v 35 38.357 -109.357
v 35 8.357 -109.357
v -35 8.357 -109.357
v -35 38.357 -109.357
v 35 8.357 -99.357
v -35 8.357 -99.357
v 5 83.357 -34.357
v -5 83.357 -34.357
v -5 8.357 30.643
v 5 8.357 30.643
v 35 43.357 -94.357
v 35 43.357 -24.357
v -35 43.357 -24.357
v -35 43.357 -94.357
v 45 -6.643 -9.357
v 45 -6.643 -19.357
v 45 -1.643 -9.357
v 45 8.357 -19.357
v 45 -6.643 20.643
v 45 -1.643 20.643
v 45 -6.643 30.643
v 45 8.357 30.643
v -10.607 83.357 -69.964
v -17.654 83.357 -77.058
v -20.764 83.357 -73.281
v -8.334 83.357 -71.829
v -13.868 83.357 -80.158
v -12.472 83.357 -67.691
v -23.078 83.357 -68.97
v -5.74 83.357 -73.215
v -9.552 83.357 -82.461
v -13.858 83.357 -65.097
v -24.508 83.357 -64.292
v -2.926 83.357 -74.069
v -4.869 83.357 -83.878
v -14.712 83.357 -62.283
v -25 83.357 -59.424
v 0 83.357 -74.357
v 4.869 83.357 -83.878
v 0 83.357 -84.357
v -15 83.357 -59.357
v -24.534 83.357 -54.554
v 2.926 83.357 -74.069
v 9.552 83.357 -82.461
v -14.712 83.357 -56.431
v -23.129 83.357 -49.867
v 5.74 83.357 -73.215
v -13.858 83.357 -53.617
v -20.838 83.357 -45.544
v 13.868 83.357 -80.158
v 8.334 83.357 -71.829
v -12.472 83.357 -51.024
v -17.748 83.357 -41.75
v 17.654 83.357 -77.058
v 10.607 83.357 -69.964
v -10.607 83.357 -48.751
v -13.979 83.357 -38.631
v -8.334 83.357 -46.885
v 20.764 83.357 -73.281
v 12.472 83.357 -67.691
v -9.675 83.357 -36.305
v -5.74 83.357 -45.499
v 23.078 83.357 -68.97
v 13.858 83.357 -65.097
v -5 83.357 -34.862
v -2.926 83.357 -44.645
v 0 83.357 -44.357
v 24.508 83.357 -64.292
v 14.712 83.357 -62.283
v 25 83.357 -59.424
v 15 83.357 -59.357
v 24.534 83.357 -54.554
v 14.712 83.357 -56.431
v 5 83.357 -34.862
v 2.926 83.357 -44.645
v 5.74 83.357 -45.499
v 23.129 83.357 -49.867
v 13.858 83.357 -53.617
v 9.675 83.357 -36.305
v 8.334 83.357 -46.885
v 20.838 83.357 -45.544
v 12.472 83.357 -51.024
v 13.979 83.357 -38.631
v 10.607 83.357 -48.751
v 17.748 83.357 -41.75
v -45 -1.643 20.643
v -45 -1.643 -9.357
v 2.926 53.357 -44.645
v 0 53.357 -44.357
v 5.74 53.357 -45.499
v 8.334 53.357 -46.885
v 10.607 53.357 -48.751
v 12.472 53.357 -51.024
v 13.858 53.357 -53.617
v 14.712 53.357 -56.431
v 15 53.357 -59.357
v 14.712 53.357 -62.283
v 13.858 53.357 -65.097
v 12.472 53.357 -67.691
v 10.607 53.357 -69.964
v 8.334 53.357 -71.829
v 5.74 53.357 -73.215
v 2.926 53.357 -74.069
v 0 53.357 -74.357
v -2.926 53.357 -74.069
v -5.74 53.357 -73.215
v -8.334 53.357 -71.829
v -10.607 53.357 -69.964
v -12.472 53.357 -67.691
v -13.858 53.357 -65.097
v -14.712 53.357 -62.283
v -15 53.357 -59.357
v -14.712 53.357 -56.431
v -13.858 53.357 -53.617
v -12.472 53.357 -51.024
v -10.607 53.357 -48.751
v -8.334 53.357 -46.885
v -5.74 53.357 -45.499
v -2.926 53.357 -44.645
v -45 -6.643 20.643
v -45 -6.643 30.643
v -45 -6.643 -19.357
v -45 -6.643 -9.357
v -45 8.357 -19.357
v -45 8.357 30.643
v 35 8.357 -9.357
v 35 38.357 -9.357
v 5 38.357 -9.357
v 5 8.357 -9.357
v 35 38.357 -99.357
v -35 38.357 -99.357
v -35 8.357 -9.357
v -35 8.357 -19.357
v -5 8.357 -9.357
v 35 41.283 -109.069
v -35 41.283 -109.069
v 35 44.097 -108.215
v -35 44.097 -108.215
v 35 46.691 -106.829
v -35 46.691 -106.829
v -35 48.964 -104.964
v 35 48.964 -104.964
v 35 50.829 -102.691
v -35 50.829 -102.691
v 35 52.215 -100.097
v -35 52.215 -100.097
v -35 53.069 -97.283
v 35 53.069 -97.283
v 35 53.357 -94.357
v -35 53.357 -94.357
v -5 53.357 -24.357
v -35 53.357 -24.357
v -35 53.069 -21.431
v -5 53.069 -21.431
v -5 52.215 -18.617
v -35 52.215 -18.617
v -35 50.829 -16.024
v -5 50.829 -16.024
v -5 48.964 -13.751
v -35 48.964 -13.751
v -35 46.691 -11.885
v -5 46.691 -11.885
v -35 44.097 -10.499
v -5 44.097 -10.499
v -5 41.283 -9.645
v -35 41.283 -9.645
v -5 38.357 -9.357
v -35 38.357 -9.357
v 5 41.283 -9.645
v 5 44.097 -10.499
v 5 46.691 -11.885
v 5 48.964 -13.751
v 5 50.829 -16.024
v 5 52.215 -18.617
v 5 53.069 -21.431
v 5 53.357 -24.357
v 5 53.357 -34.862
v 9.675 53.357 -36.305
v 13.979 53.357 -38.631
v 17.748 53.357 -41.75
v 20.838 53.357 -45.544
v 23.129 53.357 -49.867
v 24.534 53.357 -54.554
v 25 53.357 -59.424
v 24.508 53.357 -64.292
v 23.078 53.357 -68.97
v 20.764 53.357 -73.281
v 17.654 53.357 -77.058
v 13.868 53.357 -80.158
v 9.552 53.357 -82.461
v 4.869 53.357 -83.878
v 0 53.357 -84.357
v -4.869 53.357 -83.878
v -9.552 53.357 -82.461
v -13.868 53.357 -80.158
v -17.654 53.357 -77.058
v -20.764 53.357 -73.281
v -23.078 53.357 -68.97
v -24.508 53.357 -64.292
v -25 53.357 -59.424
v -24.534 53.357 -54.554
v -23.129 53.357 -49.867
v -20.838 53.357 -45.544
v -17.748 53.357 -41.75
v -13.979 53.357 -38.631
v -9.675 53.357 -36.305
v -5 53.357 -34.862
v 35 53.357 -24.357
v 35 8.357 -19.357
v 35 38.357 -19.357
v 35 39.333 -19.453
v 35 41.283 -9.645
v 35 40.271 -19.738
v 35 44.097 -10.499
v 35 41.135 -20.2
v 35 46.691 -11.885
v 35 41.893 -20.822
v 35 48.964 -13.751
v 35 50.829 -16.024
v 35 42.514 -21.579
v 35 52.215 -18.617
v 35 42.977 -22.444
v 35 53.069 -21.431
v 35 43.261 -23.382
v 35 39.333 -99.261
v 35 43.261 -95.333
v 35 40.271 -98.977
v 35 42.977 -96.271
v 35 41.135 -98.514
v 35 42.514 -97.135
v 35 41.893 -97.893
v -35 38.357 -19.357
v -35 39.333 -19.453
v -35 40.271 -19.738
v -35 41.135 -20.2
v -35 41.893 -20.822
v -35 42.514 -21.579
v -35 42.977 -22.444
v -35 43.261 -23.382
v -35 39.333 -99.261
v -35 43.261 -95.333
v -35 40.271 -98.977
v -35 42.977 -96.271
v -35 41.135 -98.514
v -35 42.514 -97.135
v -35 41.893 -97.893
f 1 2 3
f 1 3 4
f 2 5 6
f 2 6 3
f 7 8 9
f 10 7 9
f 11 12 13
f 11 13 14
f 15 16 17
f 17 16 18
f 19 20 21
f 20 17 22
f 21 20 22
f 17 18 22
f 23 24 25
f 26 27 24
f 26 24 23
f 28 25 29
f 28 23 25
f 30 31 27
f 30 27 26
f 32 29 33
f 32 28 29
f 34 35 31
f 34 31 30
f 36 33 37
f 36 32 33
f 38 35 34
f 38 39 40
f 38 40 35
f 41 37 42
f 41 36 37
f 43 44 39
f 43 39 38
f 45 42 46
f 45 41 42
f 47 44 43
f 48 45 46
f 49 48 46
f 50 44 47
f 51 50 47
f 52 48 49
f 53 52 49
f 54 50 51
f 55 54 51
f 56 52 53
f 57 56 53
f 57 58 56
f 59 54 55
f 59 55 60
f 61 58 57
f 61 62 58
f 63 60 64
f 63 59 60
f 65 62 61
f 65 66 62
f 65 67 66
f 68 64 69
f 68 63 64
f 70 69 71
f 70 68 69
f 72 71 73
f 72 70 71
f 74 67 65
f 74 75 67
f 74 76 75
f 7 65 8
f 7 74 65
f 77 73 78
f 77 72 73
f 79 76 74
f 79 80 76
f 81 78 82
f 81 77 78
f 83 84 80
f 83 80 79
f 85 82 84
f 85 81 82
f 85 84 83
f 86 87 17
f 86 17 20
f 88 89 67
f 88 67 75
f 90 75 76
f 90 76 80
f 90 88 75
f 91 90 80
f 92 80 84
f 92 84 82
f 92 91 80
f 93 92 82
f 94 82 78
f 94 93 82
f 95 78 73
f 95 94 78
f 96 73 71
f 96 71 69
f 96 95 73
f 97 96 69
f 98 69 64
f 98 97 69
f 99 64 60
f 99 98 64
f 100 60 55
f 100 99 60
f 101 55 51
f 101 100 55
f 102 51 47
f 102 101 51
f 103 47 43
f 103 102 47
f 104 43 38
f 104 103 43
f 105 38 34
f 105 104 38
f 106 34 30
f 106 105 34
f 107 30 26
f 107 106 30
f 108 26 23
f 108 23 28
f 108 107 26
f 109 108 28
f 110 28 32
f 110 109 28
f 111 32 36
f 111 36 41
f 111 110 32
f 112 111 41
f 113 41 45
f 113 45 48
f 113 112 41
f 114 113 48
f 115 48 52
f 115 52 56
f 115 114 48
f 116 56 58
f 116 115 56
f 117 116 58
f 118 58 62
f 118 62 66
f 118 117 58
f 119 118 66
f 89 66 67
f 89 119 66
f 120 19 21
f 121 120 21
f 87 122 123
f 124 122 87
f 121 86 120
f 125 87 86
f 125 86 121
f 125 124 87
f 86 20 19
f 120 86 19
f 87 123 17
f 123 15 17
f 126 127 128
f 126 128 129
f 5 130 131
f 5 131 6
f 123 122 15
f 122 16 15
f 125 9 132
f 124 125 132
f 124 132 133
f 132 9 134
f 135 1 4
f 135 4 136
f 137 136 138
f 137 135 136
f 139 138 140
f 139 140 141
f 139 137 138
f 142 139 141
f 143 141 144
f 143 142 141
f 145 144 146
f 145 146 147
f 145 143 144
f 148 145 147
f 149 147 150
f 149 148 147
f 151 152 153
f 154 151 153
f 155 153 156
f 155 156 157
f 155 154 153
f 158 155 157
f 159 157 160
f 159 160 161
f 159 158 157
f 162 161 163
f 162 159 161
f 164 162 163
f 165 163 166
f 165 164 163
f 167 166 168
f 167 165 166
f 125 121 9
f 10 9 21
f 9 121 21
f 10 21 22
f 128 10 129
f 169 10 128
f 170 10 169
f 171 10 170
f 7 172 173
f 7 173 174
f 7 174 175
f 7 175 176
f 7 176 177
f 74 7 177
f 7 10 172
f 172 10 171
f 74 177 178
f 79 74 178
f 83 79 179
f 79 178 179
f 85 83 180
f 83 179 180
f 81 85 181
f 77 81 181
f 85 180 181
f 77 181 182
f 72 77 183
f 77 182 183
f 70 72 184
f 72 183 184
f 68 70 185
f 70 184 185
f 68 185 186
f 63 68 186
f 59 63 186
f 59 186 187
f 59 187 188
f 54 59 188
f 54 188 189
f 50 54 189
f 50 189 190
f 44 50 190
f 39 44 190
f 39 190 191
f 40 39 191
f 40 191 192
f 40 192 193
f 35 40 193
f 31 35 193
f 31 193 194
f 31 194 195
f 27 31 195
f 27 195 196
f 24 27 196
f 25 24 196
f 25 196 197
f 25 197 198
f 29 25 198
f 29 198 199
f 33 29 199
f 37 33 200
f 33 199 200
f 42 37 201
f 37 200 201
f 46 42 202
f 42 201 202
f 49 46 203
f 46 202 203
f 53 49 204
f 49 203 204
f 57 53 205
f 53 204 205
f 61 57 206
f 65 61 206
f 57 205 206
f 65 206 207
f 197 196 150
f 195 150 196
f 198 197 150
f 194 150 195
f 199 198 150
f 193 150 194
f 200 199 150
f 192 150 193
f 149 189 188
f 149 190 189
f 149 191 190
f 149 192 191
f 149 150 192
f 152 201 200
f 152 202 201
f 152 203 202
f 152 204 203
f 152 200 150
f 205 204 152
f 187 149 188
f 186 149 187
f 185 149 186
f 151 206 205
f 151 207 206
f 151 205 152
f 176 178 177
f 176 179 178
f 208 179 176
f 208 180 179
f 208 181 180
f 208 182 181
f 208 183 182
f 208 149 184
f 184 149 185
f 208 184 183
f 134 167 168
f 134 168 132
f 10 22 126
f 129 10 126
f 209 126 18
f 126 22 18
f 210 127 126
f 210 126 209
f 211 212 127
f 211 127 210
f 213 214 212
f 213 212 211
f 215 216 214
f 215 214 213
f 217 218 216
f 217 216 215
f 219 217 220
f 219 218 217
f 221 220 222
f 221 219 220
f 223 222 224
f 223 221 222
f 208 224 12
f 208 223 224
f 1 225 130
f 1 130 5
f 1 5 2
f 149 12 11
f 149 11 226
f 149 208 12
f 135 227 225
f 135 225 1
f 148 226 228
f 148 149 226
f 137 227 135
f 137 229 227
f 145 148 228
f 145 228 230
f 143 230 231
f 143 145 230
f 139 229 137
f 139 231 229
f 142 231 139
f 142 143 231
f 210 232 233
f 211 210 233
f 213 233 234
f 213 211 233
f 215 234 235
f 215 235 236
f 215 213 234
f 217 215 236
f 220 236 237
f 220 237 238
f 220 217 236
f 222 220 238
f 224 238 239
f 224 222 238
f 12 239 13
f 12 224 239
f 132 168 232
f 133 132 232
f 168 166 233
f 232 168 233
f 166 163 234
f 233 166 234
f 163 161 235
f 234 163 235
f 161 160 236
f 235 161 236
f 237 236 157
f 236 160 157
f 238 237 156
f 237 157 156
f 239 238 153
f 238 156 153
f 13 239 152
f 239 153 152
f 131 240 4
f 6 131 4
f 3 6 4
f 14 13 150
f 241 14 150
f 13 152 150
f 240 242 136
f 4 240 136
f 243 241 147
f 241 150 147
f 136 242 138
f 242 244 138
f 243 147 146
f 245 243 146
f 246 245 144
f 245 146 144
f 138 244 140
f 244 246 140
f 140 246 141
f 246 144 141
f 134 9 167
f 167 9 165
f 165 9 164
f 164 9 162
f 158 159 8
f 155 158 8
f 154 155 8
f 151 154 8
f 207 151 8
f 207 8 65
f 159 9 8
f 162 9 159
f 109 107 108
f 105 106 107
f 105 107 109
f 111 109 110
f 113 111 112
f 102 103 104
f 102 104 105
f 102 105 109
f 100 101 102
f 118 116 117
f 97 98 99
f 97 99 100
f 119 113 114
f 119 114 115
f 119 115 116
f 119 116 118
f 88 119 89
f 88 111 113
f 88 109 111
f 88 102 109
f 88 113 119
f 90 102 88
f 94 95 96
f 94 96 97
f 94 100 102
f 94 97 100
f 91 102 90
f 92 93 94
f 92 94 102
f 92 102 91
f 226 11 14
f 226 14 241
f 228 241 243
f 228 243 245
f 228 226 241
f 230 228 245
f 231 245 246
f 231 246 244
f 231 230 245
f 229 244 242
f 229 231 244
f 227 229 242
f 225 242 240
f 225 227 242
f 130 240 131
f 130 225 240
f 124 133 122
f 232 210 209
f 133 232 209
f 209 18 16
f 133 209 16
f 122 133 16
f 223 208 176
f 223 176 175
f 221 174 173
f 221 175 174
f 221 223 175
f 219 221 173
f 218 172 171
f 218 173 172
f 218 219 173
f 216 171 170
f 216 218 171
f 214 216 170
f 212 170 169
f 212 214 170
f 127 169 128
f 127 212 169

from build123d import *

# Parameters (mm, degrees)
BOSS_EXTRUDE1_DEPTH = 45
BOSS_EXTRUDE2_START = -10
BOSS_EXTRUDE2_DEPTH = 70
SKETCH5_R           = 25
SKETCH5_R_2         = 15
BOSS_EXTRUDE3_DEPTH = 30
RIB3_START          = -5
RIB3_DEPTH          = 10


with BuildPart() as part:
    # Sketch1 → Boss-Extrude1 (new, symmetric)
    with BuildSketch(Plane(origin=(0, 0, 0), x_dir=(0, 0, -1), z_dir=(1, 0, 0))):
        Polygon((-20.642857143, -6.642857143), (-30.642857143, -6.642857143), (-30.642857143, 8.357142857), (19.357142857, 8.357142857), (19.357142857, -6.642857143), (9.357142857, -6.642857143), (9.357142857, -1.642857143), (-20.642857143, -1.642857143), align=None)
    extrude(amount=BOSS_EXTRUDE1_DEPTH, both=True)

    # Sketch2 → Boss-Extrude2 (add)
    with BuildSketch(Plane(origin=(45, 0, 0), x_dir=(0, 0, -1), z_dir=(1, 0, 0)).offset(BOSS_EXTRUDE2_START)):
        with BuildLine():
            Line((19.357142857, 8.357142857), (19.357142857, 38.357142857))
            ThreePointArc((19.357142857, 38.357142857), (20.821608951, 41.892676763), (24.357142857, 43.357142857))
            Line((24.357142857, 43.357142857), (94.357142857, 43.357142857))
            ThreePointArc((94.357142857, 43.357142857), (97.892676763, 41.892676763), (99.357142857, 38.357142857))
            Line((99.357142857, 38.357142857), (99.357142857, 8.357142857))
            Line((99.357142857, 8.357142857), (109.357142857, 8.357142857))
            Line((109.357142857, 8.357142857), (109.357142857, 38.357142857))
            ThreePointArc((109.357142857, 38.357142857), (104.963744575, 48.963744575), (94.357142857, 53.357142857))
            Line((94.357142857, 53.357142857), (24.357142857, 53.357142857))
            ThreePointArc((24.357142857, 53.357142857), (13.750541139, 48.963744575), (9.357142857, 38.357142857))
            Line((9.357142857, 38.357142857), (9.357142857, 8.357142857))
            Line((9.357142857, 8.357142857), (19.357142857, 8.357142857))
        make_face()
    extrude(amount=-BOSS_EXTRUDE2_DEPTH)

    # Sketch5 → Boss-Extrude3 (add)
    with BuildSketch(Plane(origin=(0, 53.357142857, 0), x_dir=(1, 0, 0), z_dir=(0, 1, 0))):
        with Locations(Location((0, 59.357142857, 0), (0, 0, 270))):
            Circle(SKETCH5_R)
        with Locations(Location((0, 59.357142857, 0), (0, 0, 270))):
            Circle(SKETCH5_R_2, mode=Mode.SUBTRACT)
    extrude(amount=BOSS_EXTRUDE3_DEPTH)

    # Rib3: read off the stored shape, not the designer's step
    # Rib3 outline → Rib3 (add)
    with BuildSketch(Plane(origin=(0, 0, 0), x_dir=(0, 0, -1), z_dir=(1, 0, 0)).offset(RIB3_START)):
        with BuildLine():
            Line((34.862245429, 83.357142857), (34.357142857, 83.357142857))
            Line((34.357142857, 83.357142857), (-30.642857143, 8.357142857))
            Line((-30.642857143, 8.357142857), (9.357142857, 8.357142857))
            Line((9.357142857, 8.357142857), (9.357142857, 38.357142857))
            ThreePointArc((9.357142857, 38.357142857), (13.750541139, 48.963744575), (24.357142857, 53.357142857))
            Line((24.357142857, 53.357142857), (34.862245429, 53.357142857))
            Line((34.862245429, 53.357142857), (34.862245429, 83.357142857))
        make_face()
    extrude(amount=RIB3_DEPTH)


solid = part.part
